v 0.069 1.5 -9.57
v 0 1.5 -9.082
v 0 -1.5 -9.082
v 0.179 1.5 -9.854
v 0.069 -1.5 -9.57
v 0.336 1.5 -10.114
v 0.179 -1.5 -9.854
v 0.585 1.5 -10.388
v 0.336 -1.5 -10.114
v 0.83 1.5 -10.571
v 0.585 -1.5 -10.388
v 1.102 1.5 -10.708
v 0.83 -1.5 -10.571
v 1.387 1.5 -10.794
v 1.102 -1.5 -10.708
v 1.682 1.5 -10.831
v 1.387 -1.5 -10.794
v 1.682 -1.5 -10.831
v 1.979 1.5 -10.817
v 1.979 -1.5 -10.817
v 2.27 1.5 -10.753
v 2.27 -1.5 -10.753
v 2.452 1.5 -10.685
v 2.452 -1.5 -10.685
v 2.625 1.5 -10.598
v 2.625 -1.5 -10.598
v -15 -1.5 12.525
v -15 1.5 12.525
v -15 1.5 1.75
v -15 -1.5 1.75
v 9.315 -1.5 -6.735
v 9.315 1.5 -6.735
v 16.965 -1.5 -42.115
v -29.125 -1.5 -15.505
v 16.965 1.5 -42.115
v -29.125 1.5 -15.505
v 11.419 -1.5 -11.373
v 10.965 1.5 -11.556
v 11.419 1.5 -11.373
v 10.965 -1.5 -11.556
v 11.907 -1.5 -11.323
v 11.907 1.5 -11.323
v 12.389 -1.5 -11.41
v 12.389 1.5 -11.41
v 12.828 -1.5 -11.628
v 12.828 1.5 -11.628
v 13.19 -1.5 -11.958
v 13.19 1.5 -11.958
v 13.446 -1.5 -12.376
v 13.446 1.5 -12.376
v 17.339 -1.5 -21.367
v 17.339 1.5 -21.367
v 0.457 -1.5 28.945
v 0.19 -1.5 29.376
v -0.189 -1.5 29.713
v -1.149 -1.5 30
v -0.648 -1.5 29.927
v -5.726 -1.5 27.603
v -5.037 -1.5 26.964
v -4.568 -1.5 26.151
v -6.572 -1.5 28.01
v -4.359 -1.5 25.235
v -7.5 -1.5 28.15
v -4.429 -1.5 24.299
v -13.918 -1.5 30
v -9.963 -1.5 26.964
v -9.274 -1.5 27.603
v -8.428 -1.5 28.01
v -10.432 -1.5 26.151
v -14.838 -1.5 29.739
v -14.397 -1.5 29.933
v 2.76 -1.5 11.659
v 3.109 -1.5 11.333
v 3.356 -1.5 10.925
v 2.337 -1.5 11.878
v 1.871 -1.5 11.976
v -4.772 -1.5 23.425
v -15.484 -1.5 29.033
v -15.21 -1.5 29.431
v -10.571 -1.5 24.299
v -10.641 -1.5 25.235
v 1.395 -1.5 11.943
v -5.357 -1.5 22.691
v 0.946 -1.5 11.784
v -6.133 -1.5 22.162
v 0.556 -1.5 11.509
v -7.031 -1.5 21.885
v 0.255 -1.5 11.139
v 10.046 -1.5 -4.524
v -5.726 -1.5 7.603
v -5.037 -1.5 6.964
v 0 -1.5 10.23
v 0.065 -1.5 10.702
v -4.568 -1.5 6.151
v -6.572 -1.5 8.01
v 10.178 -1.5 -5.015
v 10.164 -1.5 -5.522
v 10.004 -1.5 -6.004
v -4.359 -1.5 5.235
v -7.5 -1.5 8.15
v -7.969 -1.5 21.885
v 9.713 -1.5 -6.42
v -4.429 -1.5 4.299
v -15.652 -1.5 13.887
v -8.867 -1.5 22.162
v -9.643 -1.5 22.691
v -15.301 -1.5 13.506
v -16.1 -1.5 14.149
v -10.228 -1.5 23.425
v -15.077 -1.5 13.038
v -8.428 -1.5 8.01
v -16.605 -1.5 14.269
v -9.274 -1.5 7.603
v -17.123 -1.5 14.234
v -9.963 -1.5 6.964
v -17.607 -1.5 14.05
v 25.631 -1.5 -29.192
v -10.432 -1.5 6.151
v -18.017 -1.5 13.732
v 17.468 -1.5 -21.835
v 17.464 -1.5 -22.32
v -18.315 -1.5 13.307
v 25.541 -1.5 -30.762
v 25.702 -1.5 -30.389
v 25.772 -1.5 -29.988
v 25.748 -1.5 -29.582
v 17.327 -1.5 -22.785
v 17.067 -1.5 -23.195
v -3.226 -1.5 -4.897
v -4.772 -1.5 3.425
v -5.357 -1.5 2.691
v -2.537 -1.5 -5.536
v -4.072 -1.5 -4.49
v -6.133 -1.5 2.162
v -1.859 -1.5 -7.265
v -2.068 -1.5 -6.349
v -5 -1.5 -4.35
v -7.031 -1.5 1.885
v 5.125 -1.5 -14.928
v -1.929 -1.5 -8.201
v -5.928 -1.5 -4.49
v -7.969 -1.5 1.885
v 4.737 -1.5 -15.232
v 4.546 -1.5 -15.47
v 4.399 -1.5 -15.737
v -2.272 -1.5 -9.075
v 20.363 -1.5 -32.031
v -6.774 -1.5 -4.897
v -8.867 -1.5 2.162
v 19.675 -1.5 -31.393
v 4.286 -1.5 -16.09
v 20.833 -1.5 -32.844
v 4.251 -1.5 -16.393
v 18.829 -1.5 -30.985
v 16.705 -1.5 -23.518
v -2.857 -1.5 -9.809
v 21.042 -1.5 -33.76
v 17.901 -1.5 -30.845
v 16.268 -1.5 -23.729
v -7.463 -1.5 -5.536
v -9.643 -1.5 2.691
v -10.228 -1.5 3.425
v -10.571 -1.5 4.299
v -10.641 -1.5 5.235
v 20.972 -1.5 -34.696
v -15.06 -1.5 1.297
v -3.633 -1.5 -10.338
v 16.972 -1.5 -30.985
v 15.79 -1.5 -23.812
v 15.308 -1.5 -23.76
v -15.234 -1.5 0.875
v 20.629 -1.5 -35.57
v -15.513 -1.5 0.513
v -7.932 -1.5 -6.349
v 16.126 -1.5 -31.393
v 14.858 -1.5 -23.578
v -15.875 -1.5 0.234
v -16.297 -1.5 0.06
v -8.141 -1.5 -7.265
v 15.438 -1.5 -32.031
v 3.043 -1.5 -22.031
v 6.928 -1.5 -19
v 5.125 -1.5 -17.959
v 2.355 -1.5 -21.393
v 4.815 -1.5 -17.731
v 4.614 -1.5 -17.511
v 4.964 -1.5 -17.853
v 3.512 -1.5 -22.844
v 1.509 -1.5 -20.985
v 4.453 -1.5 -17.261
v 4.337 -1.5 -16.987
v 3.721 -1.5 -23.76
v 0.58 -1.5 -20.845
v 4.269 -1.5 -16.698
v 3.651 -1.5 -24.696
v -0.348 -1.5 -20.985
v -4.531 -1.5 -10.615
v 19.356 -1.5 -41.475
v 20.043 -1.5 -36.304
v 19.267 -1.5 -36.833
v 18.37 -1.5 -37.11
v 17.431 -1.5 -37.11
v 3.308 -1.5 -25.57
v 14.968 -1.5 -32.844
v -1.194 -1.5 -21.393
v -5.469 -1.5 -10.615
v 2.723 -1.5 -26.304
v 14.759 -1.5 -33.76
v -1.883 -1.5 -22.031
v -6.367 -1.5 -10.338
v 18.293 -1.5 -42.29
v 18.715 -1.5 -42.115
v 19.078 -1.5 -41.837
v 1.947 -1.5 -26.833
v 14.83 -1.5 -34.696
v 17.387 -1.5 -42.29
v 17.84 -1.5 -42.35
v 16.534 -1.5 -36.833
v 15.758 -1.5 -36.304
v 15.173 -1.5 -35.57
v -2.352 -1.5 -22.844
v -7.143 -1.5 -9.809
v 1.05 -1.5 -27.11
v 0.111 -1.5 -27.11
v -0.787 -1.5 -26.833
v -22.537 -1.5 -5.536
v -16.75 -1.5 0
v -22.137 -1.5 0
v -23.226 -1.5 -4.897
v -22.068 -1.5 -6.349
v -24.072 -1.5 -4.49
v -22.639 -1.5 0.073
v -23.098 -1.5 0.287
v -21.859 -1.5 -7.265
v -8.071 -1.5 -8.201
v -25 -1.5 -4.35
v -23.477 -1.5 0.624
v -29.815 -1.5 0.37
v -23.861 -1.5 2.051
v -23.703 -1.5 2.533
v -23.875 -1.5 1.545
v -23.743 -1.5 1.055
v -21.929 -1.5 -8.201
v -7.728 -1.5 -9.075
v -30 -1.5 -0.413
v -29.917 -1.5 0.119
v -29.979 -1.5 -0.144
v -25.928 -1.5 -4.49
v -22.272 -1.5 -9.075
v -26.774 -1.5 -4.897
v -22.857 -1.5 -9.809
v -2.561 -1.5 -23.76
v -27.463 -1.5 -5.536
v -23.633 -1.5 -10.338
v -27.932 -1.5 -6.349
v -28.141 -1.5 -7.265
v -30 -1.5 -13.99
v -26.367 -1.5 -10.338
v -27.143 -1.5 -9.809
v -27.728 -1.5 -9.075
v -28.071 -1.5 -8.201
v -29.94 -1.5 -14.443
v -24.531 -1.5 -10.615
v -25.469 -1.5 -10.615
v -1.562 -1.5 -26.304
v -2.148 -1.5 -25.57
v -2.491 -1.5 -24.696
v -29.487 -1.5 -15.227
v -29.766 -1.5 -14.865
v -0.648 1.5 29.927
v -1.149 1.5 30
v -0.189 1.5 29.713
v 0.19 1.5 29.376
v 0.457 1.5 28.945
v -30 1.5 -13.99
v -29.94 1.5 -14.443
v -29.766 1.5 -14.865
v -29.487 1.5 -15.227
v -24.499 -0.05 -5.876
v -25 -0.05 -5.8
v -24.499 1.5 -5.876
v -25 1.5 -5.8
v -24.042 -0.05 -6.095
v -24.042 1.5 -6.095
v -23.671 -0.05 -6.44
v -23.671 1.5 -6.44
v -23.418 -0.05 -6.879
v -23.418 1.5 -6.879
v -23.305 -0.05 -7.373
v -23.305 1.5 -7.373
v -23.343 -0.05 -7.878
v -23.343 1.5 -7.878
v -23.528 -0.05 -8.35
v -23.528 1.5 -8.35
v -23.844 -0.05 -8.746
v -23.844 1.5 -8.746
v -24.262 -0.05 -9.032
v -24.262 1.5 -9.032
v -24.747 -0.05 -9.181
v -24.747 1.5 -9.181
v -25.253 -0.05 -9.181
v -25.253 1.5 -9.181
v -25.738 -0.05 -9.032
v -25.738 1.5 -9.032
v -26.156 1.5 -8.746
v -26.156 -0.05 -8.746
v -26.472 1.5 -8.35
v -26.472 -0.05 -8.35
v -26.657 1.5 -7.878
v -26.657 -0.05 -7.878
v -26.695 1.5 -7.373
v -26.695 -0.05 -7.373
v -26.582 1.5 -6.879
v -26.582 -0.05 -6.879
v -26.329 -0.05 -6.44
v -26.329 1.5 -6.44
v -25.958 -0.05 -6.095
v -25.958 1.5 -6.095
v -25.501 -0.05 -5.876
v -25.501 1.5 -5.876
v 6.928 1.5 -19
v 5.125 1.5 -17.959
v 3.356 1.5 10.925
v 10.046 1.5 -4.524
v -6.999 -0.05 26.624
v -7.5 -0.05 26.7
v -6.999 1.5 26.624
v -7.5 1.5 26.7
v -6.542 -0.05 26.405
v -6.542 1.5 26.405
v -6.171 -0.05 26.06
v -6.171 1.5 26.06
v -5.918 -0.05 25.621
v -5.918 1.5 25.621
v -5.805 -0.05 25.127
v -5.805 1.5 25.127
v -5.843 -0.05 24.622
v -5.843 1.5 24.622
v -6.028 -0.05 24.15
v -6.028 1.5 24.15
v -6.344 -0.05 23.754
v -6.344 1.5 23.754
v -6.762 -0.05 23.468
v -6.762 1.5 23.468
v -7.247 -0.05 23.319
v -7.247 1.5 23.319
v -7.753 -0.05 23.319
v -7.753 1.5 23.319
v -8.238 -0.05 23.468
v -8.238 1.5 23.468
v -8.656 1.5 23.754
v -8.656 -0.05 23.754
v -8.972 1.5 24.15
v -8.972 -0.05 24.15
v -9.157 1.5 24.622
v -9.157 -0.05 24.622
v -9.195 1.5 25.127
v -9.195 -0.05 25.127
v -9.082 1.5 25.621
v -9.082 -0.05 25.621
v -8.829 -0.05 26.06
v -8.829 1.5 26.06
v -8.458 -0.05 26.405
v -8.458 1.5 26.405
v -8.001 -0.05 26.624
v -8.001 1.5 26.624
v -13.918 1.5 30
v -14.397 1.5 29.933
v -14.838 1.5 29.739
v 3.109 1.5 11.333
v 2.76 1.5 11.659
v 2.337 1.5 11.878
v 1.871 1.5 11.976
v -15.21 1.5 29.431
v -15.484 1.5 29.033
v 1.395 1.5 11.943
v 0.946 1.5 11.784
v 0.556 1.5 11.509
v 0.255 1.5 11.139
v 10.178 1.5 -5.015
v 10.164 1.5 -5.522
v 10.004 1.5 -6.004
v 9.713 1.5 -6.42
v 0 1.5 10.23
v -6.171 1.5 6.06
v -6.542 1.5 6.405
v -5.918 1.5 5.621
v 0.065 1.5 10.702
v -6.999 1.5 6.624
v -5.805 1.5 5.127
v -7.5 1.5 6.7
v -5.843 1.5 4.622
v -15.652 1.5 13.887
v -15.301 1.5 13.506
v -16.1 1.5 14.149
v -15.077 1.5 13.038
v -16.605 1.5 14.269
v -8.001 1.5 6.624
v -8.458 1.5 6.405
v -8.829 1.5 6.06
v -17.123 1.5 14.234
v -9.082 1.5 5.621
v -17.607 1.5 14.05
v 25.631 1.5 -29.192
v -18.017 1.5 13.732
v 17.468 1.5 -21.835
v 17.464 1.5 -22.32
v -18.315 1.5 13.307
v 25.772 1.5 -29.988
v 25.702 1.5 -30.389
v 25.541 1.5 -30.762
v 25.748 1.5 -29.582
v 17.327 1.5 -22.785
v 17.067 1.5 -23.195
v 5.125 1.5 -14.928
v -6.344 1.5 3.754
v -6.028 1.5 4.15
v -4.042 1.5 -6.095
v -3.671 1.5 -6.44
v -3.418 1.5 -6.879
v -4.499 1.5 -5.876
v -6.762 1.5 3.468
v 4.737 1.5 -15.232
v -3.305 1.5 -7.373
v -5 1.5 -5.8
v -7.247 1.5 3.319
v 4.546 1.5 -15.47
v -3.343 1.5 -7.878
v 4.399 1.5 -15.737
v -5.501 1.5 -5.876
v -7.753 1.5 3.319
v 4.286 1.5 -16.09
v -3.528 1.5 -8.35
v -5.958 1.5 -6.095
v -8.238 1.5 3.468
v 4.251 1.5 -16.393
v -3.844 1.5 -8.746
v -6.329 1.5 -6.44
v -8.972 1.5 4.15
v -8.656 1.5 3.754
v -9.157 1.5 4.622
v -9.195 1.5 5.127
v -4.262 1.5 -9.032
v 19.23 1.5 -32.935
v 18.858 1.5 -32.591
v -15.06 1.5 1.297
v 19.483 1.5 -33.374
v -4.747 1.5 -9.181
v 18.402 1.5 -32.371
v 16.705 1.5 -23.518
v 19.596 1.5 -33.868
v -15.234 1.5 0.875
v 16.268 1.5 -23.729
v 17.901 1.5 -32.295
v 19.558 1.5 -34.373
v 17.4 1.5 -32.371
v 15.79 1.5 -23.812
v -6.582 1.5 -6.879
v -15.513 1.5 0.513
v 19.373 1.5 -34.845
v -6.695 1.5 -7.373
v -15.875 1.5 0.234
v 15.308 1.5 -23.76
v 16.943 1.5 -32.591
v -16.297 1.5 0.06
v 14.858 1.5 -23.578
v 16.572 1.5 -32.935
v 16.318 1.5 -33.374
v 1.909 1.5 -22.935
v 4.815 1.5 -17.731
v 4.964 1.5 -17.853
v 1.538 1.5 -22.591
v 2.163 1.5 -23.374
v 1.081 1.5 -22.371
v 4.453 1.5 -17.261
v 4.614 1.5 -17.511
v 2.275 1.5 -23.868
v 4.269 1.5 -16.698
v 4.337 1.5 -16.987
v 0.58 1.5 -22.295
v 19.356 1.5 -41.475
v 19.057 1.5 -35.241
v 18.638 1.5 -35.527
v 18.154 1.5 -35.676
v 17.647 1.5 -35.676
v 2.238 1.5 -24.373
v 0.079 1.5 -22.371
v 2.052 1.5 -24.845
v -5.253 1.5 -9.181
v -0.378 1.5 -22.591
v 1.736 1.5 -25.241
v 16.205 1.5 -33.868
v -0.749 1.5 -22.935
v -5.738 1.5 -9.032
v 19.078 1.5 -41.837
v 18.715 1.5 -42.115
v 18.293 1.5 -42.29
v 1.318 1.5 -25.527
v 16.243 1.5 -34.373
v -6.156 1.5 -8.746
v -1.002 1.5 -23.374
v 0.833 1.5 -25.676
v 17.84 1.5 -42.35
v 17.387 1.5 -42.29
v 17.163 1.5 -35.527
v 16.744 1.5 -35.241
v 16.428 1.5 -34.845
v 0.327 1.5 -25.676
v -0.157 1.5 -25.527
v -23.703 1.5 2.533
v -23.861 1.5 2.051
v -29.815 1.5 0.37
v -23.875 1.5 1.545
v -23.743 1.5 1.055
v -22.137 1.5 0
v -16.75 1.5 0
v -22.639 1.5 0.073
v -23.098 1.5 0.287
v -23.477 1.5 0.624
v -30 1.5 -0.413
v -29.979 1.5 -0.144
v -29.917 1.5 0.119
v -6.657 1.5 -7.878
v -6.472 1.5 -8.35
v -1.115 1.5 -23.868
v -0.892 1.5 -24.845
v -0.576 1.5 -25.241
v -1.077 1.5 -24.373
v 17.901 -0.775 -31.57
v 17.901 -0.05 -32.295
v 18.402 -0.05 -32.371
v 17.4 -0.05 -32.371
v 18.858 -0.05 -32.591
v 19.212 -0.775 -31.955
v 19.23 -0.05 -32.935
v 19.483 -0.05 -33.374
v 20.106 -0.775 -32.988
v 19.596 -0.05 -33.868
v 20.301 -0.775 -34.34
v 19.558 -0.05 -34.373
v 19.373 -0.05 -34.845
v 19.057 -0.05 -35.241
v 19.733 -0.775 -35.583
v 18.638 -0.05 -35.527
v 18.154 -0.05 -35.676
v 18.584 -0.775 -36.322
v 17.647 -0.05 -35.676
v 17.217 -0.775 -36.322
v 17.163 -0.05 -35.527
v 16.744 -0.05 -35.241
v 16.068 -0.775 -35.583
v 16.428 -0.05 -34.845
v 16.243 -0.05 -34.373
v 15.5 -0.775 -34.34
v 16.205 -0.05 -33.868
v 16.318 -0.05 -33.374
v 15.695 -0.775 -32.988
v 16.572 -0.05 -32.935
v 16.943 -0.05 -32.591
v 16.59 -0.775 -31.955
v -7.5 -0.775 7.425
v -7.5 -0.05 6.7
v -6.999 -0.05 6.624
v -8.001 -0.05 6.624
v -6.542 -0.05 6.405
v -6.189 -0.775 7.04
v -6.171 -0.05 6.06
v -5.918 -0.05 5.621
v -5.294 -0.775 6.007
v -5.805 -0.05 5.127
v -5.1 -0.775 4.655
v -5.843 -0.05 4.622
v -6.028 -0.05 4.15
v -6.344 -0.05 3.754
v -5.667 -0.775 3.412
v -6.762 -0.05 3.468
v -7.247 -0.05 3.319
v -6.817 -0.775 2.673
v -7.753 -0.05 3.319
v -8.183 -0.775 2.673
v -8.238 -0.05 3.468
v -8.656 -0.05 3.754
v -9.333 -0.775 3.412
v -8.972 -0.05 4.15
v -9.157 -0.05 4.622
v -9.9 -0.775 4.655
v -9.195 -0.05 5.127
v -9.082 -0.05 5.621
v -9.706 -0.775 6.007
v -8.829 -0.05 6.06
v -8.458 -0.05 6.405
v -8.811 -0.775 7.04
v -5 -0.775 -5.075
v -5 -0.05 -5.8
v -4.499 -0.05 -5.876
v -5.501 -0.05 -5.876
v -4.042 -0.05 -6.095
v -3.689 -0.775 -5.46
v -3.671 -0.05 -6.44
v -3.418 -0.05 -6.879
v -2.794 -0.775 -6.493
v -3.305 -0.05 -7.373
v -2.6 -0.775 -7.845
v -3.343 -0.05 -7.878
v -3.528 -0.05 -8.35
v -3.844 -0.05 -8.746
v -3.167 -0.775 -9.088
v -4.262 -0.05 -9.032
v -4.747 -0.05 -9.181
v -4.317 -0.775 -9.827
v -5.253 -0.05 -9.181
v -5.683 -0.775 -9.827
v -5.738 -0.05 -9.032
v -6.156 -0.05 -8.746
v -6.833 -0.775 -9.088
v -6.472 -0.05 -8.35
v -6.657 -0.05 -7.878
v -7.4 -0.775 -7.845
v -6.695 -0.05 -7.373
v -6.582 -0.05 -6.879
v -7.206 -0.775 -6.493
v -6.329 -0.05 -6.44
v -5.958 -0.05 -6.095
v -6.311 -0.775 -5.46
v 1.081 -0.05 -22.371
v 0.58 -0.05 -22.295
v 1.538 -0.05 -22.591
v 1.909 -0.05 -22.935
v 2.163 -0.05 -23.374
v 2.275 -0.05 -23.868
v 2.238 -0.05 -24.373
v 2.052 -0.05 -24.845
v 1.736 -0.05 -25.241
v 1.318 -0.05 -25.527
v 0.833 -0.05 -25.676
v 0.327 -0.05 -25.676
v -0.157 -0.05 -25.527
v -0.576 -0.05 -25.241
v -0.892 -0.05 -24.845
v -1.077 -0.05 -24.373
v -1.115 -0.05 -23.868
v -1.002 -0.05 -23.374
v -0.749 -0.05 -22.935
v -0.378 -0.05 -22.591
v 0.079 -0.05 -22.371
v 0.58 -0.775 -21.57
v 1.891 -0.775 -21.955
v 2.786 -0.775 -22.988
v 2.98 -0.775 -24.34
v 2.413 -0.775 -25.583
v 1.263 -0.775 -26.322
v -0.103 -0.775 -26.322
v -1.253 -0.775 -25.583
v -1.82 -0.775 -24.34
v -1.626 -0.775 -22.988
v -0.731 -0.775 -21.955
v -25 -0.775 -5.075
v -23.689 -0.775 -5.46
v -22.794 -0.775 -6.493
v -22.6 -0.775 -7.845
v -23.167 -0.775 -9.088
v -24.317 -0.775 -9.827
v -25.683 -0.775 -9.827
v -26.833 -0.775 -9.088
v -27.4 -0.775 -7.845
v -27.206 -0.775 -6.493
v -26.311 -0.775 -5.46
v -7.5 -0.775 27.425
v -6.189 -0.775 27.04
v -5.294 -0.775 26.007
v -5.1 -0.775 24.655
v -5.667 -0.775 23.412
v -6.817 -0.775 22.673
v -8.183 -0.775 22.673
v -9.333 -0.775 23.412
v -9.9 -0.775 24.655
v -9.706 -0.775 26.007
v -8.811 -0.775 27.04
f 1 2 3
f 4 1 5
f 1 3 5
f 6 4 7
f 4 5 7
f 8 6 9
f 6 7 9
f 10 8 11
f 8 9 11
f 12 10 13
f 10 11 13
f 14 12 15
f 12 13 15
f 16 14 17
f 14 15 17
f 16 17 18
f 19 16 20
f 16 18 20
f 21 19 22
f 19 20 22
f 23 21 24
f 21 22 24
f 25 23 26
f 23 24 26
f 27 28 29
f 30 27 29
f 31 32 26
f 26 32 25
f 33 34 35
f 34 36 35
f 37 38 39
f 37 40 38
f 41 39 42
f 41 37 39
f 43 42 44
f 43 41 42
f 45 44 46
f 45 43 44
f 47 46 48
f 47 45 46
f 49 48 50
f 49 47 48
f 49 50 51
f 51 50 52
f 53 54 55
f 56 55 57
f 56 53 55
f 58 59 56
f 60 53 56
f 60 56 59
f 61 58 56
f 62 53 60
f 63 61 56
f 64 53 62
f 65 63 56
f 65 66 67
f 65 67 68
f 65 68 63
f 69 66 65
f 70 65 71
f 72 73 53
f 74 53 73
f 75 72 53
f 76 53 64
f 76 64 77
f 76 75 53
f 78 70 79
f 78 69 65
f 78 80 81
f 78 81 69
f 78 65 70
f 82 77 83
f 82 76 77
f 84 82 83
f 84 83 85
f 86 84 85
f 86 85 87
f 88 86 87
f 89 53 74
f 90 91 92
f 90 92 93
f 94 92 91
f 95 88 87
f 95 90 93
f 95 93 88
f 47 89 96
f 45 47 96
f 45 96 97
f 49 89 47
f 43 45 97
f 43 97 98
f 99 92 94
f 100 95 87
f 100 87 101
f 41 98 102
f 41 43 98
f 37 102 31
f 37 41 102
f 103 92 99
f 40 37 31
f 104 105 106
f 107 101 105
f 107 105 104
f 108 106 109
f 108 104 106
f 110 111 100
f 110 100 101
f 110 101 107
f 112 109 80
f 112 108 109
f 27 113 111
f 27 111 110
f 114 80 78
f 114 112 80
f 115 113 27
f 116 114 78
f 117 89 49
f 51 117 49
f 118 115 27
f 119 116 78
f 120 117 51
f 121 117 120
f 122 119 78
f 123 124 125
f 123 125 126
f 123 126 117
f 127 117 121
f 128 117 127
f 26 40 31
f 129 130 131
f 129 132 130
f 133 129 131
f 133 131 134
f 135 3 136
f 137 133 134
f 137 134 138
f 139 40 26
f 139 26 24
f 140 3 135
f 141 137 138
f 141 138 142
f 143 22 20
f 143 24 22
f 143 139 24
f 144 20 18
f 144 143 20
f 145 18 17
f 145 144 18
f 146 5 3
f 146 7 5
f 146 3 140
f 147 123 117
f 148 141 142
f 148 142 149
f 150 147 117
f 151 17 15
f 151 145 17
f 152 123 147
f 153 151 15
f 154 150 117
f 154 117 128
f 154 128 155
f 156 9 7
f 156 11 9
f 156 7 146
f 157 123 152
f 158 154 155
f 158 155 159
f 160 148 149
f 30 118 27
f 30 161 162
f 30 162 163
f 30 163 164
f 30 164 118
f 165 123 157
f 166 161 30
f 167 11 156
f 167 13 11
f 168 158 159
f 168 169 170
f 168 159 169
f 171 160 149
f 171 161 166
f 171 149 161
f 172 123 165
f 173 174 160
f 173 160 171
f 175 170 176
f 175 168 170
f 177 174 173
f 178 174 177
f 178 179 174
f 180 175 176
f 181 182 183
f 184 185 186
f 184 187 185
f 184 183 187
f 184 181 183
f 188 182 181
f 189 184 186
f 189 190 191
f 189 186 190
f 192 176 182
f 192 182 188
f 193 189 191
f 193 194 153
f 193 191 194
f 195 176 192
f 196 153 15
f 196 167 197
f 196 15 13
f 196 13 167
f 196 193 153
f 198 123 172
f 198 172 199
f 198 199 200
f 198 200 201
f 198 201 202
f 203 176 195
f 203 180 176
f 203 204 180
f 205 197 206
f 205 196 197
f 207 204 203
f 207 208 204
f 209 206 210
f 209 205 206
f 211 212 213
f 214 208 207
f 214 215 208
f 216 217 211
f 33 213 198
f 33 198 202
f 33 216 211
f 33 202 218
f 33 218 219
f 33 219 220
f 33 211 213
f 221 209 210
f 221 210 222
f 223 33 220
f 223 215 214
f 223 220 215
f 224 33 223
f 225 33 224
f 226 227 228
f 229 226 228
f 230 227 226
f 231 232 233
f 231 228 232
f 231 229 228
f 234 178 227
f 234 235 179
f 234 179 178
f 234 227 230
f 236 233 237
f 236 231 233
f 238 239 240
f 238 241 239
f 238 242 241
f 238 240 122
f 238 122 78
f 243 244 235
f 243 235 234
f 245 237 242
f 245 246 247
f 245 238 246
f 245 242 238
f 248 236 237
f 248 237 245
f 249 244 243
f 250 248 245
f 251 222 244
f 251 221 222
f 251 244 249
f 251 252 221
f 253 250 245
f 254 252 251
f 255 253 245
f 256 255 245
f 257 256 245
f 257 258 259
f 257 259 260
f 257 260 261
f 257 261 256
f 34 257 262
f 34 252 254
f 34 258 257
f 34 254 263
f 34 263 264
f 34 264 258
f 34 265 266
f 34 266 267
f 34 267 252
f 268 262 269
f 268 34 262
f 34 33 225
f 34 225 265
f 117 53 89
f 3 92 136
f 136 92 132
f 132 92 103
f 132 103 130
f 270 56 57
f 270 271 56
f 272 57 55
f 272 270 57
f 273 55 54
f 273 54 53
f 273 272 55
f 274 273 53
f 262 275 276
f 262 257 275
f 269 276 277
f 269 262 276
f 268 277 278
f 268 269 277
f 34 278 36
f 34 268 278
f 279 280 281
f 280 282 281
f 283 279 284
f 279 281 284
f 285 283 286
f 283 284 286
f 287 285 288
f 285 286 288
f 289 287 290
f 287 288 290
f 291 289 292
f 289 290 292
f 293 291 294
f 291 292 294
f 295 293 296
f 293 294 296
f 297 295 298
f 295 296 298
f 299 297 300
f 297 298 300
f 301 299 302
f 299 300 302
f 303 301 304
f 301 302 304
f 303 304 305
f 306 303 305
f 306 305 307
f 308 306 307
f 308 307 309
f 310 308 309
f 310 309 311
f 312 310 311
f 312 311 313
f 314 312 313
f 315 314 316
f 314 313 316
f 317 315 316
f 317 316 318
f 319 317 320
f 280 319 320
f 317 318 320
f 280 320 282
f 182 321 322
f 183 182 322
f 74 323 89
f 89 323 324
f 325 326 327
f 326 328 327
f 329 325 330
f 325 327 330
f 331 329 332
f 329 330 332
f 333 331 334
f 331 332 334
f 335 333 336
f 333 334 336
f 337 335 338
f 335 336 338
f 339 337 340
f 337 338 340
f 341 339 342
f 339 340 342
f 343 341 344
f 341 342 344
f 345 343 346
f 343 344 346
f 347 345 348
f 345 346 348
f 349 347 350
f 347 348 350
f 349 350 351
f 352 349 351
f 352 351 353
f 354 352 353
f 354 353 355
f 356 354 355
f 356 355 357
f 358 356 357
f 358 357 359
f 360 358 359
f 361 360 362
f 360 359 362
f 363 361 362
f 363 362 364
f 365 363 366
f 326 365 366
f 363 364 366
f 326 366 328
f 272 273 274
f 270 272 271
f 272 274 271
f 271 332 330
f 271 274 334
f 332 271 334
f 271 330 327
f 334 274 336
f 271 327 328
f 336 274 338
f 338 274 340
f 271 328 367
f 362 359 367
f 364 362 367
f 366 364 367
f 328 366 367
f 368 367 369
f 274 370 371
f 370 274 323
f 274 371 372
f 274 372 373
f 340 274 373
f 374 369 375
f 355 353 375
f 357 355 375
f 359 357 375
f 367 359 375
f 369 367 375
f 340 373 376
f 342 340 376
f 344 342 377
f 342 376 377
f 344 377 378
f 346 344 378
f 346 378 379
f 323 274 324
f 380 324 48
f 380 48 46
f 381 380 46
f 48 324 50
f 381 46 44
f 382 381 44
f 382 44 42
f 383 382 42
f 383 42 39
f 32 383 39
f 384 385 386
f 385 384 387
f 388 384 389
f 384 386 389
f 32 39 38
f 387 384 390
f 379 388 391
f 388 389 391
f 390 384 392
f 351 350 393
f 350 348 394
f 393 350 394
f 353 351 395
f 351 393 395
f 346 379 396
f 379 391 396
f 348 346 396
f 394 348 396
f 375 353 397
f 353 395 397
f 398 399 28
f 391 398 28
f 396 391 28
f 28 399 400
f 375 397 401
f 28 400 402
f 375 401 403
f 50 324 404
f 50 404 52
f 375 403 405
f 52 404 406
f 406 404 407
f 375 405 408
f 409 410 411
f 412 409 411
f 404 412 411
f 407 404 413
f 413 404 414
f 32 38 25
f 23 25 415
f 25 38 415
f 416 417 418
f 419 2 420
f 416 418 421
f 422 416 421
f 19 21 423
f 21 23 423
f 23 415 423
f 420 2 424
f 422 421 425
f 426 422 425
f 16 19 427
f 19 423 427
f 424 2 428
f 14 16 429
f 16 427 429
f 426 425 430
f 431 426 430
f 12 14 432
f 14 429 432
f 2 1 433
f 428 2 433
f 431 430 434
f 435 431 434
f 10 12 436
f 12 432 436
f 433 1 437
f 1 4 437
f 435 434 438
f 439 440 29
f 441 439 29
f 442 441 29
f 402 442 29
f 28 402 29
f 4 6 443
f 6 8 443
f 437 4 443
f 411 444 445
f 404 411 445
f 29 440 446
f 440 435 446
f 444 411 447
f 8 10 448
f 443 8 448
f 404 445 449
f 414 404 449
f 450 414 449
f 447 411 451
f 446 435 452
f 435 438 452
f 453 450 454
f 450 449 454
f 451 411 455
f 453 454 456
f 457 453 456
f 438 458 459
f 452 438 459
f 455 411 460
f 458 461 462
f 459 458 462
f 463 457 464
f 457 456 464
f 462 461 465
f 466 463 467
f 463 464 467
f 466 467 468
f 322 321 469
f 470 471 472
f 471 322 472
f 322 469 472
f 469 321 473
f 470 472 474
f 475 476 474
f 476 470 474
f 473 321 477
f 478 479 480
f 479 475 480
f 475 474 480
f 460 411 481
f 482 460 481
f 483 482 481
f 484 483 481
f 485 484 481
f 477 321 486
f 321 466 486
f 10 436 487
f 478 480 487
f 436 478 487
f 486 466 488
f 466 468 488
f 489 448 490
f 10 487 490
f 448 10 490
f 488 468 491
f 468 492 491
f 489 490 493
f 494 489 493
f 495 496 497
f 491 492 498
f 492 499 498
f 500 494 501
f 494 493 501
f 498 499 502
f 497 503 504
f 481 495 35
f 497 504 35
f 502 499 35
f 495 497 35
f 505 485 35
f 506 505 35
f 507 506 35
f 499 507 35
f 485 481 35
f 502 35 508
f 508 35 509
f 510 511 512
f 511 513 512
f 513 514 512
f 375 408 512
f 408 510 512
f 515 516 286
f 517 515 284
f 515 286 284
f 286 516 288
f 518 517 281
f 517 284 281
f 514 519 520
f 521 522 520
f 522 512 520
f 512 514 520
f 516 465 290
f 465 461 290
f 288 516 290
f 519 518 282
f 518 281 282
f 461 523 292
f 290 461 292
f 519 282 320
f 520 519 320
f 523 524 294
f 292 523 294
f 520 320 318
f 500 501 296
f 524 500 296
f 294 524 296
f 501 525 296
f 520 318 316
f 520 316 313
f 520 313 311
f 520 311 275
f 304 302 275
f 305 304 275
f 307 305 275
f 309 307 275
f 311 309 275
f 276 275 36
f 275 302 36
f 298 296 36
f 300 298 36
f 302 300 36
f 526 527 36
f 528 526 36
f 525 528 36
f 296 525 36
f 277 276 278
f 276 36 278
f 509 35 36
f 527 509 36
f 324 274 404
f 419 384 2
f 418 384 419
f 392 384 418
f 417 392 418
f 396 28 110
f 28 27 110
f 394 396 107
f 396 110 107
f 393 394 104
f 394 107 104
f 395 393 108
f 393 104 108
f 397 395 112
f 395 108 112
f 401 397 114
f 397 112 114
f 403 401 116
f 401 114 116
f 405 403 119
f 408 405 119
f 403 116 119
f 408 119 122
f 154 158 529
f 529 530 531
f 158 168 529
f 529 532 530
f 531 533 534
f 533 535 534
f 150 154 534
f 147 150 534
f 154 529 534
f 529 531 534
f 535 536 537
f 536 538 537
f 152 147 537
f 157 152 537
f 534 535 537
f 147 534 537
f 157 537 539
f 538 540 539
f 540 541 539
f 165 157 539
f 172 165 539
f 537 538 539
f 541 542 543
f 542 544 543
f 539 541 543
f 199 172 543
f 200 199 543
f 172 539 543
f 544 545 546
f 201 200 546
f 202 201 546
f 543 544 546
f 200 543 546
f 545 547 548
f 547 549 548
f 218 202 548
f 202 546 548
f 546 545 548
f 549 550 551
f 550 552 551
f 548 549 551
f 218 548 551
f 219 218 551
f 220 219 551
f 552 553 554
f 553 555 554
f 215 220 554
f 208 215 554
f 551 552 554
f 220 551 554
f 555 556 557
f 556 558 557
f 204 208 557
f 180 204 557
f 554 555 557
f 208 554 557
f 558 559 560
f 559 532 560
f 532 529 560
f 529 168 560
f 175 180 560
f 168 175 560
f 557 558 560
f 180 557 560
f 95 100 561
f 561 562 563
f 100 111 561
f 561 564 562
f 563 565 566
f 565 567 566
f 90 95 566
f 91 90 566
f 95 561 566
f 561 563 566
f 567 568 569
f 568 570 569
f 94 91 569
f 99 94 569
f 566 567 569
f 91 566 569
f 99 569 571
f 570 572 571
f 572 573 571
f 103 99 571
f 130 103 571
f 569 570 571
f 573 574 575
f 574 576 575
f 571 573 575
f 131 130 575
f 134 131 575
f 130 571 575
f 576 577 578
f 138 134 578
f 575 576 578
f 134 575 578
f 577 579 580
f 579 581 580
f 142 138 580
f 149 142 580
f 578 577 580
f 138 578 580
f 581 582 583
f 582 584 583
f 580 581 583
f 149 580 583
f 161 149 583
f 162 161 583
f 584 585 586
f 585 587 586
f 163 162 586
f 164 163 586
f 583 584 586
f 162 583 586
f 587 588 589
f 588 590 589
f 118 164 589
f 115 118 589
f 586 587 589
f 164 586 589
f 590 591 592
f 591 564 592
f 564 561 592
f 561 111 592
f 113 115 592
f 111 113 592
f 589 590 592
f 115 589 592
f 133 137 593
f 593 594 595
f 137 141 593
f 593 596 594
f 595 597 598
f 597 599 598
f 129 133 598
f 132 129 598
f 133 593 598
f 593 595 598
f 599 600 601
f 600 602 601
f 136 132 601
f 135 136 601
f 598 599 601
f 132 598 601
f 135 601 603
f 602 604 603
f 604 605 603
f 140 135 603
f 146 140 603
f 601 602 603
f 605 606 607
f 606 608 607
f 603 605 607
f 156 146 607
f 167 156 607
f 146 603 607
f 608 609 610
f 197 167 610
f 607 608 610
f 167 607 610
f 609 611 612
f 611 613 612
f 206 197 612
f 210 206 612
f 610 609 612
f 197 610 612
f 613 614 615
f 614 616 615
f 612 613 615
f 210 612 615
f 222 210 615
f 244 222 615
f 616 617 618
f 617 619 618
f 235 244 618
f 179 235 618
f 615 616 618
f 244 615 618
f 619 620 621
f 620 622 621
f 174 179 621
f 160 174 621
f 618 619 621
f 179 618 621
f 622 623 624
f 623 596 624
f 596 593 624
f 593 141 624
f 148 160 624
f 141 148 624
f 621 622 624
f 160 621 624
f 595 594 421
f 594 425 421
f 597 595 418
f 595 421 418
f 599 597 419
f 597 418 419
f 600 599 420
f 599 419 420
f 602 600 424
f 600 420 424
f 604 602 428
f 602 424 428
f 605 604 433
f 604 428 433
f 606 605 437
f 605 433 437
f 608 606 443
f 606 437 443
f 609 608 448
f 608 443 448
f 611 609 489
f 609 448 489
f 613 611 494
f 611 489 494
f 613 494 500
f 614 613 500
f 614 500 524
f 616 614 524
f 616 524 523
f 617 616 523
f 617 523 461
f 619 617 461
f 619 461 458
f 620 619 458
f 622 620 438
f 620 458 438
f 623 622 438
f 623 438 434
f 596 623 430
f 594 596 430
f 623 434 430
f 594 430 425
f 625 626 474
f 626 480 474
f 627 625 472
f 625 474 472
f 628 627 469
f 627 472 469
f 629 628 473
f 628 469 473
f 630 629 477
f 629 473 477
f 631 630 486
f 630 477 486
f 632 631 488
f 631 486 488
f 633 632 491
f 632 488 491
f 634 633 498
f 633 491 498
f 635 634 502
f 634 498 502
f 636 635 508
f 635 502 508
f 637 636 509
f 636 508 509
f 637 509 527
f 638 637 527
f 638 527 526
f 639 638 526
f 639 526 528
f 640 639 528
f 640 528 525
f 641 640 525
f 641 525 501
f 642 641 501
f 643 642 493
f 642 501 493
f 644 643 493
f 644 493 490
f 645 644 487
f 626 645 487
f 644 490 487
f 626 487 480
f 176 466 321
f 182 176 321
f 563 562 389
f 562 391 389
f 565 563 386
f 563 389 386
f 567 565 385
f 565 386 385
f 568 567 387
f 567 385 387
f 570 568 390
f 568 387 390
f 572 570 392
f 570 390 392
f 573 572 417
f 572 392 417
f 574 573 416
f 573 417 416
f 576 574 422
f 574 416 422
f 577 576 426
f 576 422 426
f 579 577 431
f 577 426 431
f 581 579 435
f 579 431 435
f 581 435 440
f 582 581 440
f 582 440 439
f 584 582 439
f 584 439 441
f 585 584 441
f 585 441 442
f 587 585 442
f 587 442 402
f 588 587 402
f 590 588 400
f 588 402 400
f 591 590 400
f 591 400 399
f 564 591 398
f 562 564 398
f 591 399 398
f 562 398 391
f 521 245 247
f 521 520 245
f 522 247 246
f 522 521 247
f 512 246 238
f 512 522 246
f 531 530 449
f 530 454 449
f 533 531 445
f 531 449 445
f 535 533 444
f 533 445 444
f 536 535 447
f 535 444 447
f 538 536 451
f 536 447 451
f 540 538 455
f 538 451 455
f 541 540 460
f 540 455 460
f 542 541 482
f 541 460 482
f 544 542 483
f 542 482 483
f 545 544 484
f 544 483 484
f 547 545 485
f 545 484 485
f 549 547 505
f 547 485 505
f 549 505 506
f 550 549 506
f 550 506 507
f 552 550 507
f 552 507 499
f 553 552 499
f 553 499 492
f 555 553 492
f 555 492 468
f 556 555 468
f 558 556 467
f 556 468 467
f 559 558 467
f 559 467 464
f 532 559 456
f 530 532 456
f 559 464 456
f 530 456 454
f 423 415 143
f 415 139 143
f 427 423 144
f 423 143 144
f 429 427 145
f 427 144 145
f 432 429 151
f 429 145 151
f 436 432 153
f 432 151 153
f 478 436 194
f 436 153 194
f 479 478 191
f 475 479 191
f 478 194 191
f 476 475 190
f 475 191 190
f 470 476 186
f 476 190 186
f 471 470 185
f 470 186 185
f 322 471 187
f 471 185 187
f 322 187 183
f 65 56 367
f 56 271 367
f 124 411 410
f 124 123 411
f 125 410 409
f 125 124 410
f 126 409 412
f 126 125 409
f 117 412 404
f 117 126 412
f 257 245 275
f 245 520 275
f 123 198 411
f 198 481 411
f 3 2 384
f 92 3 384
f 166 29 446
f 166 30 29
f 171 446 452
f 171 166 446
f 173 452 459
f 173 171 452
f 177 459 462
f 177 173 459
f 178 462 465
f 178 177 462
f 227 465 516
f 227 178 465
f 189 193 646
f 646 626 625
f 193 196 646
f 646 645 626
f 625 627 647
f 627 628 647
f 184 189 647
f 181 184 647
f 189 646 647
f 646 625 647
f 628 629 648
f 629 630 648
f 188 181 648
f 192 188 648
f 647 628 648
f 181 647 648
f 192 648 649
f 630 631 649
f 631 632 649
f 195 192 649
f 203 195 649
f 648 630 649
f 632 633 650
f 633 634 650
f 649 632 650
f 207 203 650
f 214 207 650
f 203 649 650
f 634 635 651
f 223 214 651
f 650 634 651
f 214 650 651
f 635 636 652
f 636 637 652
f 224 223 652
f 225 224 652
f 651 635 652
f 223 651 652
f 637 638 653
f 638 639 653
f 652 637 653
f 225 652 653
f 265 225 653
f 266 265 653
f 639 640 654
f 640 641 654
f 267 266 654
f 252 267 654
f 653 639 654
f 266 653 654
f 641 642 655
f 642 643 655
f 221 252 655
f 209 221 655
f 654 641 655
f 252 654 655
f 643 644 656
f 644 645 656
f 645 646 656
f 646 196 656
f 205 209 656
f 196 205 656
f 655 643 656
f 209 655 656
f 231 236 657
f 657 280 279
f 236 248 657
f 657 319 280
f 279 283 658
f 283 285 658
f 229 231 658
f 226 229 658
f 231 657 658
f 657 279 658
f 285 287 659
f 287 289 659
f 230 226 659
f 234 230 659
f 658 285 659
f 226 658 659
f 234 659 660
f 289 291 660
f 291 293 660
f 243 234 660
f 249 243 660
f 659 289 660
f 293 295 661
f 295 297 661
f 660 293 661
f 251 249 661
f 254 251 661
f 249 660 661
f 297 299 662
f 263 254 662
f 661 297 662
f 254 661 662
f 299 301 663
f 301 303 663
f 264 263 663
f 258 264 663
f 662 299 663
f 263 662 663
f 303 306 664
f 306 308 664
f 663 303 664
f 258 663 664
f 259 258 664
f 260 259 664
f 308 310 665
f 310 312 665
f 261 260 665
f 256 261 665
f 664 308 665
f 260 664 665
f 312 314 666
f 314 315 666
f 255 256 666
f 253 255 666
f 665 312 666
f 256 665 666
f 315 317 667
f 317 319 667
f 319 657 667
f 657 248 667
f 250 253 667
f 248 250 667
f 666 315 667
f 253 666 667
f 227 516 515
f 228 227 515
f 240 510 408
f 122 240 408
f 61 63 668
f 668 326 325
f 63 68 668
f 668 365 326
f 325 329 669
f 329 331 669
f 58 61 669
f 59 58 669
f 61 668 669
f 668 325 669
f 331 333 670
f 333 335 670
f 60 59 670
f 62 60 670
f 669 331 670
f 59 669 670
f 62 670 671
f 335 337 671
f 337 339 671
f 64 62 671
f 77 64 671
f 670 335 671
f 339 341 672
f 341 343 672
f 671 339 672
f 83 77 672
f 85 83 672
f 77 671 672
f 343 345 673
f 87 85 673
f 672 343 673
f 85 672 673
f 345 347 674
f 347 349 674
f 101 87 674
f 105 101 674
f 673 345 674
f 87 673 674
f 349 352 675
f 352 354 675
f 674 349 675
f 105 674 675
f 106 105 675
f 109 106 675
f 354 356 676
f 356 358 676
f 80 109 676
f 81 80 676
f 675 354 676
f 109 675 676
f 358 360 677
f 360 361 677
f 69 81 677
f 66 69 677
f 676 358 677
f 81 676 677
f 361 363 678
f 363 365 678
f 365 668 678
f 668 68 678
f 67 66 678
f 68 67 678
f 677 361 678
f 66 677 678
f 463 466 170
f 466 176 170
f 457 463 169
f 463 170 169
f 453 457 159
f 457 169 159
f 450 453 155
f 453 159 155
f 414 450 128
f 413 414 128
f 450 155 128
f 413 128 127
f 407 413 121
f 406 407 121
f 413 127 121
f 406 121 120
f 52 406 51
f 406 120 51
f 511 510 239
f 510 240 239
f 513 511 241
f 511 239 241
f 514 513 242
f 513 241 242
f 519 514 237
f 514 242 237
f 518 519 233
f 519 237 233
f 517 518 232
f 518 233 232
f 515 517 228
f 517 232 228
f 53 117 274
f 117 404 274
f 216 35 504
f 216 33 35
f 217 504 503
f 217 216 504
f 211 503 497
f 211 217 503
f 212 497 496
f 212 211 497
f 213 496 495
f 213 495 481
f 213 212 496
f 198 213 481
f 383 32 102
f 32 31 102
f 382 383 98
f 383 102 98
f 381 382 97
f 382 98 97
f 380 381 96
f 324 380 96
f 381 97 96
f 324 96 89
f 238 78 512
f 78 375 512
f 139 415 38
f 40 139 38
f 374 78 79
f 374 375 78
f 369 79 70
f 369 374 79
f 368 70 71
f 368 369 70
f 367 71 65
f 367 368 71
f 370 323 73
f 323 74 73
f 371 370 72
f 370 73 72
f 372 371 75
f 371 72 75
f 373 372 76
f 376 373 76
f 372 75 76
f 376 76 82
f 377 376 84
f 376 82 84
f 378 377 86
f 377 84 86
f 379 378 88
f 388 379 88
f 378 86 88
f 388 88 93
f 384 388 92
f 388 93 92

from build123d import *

# Parameters (mm, degrees)
SKETCH_4_R                   = 1.6
EXTRUDE_1_DEPTH              = 1.5
CUT_EXTRUDE_2_DEPTH          = 3
FILLET_2_R                   = 1.75
HOLE_WIZARD_M3_1_D           = 3.4
HOLE_WIZARD_M3_1_DEPTH       = 5.978536948
HOLE_WIZARD_M3_1_CSINK_D     = 6.3
HOLE_WIZARD_M3_1_CSINK_ANGLE = 90
HOLE_WIZARD_M3_1_TIP         = 1.021463052


with BuildPart() as part:
    # ｽｹｯﾁ4 → ﾎﾞｽ - 押し出し1 (new, symmetric)
    with BuildSketch(Plane(origin=(0, 0, 0), x_dir=(1, 0, 0), z_dir=(0, 1, 0))):
        Polygon((-30, 0), (-30, 15), (18.480762114, 42.990381057), (25.980762114, 30), (0, -30), (-15, -30), align=None)
        with Locations(Location((0.580127019, 23.995190528, 0), (0, 0, 270))):
            Circle(SKETCH_4_R, mode=Mode.SUBTRACT)
        with Locations(Location((-5, 7.5, 0), (0, 0, 270))):
            Circle(SKETCH_4_R, mode=Mode.SUBTRACT)
        with Locations(Location((-7.5, -5, 0), (0, 0, 270))):
            Circle(SKETCH_4_R, mode=Mode.SUBTRACT)
        with Locations(Location((-7.5, -25, 0), (0, 0, 270))):
            Circle(SKETCH_4_R, mode=Mode.SUBTRACT)
        with Locations(Location((-25, 7.5, 0), (0, 0, 270))):
            Circle(SKETCH_4_R, mode=Mode.SUBTRACT)
        with Locations(Location((17.900635095, 33.995190528, 0), (0, 0, 270))):
            Circle(SKETCH_4_R, mode=Mode.SUBTRACT)
    extrude(amount=EXTRUDE_1_DEPTH, both=True)

    # ｽｹｯﾁ5 → ｶｯﾄ - 押し出し2 (cut)
    with BuildSketch(Plane(origin=(0, 1.5, 0), x_dir=(1, 0, 0), z_dir=(0, 1, 0))):
        Polygon((12.665448219, 10.574351407), (19.442413698, 26.225082782), (6.92820323, 19), (4.714101615, 15.165063509), align=None)
        Polygon((4.714101615, 15.165063509), (6.92820323, 19), (2.5, 16.443375673), align=None)
        Polygon((2.214101615, 10.834936491), (0, 12.113248654), (0, 7), align=None)
        Polygon((0, 0), (0, -18.675248347), (10.665448219, 5.955549254), (2.214101615, 10.834936491), (0, 7), align=None)
        Polygon((-15, 0), (-24.968847051, 0), (-15, -19.937694101), align=None)
    extrude(amount=-CUT_EXTRUDE_2_DEPTH, mode=Mode.SUBTRACT)

    # ﾌｨﾚｯﾄ2
    fillet_2_edges = [part.edges().sort_by_distance(p)[0] for p in [
        (-30, 0, 0),
        (-30, 0, -15),
        (18.480762114, 0, -42.990381057),
        (25.980762114, 0, -30),
        (0, 0, 30),
        (-15, 0, 30),
        (-24.968847051, 0, 0),
        (-15, 0, 0),
        (-15, 0, 19.937694101),
        (0, 0, 18.675248347),
        (0, 0, -12.113248654),
        (10.665448219, 0, -5.955549254),
        (2.5, 0, -16.443375673),
        (19.442413698, 0, -26.225082782),
        (12.665448219, 0, -10.574351407),
    ]]
    fillet(fillet_2_edges, radius=FILLET_2_R)

    # M3 丸皿ねじ用皿穴1
    with Locations(Plane(origin=(-7.5, -1.5, 25), x_dir=(0, 0, -1), z_dir=(0, -1, 0))):
        with Locations((0, 0), (20, 0), (32.5, -17.5), (32.5, 2.5), (48.995190528, 8.080127019), (58.995190528, 25.400635095)):
            CounterSinkHole(HOLE_WIZARD_M3_1_D / 2, HOLE_WIZARD_M3_1_CSINK_D / 2, depth=HOLE_WIZARD_M3_1_DEPTH, counter_sink_angle=HOLE_WIZARD_M3_1_CSINK_ANGLE)
            with Locations((0, 0, -(HOLE_WIZARD_M3_1_DEPTH + HOLE_WIZARD_M3_1_TIP / 2))):  # 118° drill point
                Cone(0, HOLE_WIZARD_M3_1_D / 2, HOLE_WIZARD_M3_1_TIP, mode=Mode.SUBTRACT)


solid = part.part
